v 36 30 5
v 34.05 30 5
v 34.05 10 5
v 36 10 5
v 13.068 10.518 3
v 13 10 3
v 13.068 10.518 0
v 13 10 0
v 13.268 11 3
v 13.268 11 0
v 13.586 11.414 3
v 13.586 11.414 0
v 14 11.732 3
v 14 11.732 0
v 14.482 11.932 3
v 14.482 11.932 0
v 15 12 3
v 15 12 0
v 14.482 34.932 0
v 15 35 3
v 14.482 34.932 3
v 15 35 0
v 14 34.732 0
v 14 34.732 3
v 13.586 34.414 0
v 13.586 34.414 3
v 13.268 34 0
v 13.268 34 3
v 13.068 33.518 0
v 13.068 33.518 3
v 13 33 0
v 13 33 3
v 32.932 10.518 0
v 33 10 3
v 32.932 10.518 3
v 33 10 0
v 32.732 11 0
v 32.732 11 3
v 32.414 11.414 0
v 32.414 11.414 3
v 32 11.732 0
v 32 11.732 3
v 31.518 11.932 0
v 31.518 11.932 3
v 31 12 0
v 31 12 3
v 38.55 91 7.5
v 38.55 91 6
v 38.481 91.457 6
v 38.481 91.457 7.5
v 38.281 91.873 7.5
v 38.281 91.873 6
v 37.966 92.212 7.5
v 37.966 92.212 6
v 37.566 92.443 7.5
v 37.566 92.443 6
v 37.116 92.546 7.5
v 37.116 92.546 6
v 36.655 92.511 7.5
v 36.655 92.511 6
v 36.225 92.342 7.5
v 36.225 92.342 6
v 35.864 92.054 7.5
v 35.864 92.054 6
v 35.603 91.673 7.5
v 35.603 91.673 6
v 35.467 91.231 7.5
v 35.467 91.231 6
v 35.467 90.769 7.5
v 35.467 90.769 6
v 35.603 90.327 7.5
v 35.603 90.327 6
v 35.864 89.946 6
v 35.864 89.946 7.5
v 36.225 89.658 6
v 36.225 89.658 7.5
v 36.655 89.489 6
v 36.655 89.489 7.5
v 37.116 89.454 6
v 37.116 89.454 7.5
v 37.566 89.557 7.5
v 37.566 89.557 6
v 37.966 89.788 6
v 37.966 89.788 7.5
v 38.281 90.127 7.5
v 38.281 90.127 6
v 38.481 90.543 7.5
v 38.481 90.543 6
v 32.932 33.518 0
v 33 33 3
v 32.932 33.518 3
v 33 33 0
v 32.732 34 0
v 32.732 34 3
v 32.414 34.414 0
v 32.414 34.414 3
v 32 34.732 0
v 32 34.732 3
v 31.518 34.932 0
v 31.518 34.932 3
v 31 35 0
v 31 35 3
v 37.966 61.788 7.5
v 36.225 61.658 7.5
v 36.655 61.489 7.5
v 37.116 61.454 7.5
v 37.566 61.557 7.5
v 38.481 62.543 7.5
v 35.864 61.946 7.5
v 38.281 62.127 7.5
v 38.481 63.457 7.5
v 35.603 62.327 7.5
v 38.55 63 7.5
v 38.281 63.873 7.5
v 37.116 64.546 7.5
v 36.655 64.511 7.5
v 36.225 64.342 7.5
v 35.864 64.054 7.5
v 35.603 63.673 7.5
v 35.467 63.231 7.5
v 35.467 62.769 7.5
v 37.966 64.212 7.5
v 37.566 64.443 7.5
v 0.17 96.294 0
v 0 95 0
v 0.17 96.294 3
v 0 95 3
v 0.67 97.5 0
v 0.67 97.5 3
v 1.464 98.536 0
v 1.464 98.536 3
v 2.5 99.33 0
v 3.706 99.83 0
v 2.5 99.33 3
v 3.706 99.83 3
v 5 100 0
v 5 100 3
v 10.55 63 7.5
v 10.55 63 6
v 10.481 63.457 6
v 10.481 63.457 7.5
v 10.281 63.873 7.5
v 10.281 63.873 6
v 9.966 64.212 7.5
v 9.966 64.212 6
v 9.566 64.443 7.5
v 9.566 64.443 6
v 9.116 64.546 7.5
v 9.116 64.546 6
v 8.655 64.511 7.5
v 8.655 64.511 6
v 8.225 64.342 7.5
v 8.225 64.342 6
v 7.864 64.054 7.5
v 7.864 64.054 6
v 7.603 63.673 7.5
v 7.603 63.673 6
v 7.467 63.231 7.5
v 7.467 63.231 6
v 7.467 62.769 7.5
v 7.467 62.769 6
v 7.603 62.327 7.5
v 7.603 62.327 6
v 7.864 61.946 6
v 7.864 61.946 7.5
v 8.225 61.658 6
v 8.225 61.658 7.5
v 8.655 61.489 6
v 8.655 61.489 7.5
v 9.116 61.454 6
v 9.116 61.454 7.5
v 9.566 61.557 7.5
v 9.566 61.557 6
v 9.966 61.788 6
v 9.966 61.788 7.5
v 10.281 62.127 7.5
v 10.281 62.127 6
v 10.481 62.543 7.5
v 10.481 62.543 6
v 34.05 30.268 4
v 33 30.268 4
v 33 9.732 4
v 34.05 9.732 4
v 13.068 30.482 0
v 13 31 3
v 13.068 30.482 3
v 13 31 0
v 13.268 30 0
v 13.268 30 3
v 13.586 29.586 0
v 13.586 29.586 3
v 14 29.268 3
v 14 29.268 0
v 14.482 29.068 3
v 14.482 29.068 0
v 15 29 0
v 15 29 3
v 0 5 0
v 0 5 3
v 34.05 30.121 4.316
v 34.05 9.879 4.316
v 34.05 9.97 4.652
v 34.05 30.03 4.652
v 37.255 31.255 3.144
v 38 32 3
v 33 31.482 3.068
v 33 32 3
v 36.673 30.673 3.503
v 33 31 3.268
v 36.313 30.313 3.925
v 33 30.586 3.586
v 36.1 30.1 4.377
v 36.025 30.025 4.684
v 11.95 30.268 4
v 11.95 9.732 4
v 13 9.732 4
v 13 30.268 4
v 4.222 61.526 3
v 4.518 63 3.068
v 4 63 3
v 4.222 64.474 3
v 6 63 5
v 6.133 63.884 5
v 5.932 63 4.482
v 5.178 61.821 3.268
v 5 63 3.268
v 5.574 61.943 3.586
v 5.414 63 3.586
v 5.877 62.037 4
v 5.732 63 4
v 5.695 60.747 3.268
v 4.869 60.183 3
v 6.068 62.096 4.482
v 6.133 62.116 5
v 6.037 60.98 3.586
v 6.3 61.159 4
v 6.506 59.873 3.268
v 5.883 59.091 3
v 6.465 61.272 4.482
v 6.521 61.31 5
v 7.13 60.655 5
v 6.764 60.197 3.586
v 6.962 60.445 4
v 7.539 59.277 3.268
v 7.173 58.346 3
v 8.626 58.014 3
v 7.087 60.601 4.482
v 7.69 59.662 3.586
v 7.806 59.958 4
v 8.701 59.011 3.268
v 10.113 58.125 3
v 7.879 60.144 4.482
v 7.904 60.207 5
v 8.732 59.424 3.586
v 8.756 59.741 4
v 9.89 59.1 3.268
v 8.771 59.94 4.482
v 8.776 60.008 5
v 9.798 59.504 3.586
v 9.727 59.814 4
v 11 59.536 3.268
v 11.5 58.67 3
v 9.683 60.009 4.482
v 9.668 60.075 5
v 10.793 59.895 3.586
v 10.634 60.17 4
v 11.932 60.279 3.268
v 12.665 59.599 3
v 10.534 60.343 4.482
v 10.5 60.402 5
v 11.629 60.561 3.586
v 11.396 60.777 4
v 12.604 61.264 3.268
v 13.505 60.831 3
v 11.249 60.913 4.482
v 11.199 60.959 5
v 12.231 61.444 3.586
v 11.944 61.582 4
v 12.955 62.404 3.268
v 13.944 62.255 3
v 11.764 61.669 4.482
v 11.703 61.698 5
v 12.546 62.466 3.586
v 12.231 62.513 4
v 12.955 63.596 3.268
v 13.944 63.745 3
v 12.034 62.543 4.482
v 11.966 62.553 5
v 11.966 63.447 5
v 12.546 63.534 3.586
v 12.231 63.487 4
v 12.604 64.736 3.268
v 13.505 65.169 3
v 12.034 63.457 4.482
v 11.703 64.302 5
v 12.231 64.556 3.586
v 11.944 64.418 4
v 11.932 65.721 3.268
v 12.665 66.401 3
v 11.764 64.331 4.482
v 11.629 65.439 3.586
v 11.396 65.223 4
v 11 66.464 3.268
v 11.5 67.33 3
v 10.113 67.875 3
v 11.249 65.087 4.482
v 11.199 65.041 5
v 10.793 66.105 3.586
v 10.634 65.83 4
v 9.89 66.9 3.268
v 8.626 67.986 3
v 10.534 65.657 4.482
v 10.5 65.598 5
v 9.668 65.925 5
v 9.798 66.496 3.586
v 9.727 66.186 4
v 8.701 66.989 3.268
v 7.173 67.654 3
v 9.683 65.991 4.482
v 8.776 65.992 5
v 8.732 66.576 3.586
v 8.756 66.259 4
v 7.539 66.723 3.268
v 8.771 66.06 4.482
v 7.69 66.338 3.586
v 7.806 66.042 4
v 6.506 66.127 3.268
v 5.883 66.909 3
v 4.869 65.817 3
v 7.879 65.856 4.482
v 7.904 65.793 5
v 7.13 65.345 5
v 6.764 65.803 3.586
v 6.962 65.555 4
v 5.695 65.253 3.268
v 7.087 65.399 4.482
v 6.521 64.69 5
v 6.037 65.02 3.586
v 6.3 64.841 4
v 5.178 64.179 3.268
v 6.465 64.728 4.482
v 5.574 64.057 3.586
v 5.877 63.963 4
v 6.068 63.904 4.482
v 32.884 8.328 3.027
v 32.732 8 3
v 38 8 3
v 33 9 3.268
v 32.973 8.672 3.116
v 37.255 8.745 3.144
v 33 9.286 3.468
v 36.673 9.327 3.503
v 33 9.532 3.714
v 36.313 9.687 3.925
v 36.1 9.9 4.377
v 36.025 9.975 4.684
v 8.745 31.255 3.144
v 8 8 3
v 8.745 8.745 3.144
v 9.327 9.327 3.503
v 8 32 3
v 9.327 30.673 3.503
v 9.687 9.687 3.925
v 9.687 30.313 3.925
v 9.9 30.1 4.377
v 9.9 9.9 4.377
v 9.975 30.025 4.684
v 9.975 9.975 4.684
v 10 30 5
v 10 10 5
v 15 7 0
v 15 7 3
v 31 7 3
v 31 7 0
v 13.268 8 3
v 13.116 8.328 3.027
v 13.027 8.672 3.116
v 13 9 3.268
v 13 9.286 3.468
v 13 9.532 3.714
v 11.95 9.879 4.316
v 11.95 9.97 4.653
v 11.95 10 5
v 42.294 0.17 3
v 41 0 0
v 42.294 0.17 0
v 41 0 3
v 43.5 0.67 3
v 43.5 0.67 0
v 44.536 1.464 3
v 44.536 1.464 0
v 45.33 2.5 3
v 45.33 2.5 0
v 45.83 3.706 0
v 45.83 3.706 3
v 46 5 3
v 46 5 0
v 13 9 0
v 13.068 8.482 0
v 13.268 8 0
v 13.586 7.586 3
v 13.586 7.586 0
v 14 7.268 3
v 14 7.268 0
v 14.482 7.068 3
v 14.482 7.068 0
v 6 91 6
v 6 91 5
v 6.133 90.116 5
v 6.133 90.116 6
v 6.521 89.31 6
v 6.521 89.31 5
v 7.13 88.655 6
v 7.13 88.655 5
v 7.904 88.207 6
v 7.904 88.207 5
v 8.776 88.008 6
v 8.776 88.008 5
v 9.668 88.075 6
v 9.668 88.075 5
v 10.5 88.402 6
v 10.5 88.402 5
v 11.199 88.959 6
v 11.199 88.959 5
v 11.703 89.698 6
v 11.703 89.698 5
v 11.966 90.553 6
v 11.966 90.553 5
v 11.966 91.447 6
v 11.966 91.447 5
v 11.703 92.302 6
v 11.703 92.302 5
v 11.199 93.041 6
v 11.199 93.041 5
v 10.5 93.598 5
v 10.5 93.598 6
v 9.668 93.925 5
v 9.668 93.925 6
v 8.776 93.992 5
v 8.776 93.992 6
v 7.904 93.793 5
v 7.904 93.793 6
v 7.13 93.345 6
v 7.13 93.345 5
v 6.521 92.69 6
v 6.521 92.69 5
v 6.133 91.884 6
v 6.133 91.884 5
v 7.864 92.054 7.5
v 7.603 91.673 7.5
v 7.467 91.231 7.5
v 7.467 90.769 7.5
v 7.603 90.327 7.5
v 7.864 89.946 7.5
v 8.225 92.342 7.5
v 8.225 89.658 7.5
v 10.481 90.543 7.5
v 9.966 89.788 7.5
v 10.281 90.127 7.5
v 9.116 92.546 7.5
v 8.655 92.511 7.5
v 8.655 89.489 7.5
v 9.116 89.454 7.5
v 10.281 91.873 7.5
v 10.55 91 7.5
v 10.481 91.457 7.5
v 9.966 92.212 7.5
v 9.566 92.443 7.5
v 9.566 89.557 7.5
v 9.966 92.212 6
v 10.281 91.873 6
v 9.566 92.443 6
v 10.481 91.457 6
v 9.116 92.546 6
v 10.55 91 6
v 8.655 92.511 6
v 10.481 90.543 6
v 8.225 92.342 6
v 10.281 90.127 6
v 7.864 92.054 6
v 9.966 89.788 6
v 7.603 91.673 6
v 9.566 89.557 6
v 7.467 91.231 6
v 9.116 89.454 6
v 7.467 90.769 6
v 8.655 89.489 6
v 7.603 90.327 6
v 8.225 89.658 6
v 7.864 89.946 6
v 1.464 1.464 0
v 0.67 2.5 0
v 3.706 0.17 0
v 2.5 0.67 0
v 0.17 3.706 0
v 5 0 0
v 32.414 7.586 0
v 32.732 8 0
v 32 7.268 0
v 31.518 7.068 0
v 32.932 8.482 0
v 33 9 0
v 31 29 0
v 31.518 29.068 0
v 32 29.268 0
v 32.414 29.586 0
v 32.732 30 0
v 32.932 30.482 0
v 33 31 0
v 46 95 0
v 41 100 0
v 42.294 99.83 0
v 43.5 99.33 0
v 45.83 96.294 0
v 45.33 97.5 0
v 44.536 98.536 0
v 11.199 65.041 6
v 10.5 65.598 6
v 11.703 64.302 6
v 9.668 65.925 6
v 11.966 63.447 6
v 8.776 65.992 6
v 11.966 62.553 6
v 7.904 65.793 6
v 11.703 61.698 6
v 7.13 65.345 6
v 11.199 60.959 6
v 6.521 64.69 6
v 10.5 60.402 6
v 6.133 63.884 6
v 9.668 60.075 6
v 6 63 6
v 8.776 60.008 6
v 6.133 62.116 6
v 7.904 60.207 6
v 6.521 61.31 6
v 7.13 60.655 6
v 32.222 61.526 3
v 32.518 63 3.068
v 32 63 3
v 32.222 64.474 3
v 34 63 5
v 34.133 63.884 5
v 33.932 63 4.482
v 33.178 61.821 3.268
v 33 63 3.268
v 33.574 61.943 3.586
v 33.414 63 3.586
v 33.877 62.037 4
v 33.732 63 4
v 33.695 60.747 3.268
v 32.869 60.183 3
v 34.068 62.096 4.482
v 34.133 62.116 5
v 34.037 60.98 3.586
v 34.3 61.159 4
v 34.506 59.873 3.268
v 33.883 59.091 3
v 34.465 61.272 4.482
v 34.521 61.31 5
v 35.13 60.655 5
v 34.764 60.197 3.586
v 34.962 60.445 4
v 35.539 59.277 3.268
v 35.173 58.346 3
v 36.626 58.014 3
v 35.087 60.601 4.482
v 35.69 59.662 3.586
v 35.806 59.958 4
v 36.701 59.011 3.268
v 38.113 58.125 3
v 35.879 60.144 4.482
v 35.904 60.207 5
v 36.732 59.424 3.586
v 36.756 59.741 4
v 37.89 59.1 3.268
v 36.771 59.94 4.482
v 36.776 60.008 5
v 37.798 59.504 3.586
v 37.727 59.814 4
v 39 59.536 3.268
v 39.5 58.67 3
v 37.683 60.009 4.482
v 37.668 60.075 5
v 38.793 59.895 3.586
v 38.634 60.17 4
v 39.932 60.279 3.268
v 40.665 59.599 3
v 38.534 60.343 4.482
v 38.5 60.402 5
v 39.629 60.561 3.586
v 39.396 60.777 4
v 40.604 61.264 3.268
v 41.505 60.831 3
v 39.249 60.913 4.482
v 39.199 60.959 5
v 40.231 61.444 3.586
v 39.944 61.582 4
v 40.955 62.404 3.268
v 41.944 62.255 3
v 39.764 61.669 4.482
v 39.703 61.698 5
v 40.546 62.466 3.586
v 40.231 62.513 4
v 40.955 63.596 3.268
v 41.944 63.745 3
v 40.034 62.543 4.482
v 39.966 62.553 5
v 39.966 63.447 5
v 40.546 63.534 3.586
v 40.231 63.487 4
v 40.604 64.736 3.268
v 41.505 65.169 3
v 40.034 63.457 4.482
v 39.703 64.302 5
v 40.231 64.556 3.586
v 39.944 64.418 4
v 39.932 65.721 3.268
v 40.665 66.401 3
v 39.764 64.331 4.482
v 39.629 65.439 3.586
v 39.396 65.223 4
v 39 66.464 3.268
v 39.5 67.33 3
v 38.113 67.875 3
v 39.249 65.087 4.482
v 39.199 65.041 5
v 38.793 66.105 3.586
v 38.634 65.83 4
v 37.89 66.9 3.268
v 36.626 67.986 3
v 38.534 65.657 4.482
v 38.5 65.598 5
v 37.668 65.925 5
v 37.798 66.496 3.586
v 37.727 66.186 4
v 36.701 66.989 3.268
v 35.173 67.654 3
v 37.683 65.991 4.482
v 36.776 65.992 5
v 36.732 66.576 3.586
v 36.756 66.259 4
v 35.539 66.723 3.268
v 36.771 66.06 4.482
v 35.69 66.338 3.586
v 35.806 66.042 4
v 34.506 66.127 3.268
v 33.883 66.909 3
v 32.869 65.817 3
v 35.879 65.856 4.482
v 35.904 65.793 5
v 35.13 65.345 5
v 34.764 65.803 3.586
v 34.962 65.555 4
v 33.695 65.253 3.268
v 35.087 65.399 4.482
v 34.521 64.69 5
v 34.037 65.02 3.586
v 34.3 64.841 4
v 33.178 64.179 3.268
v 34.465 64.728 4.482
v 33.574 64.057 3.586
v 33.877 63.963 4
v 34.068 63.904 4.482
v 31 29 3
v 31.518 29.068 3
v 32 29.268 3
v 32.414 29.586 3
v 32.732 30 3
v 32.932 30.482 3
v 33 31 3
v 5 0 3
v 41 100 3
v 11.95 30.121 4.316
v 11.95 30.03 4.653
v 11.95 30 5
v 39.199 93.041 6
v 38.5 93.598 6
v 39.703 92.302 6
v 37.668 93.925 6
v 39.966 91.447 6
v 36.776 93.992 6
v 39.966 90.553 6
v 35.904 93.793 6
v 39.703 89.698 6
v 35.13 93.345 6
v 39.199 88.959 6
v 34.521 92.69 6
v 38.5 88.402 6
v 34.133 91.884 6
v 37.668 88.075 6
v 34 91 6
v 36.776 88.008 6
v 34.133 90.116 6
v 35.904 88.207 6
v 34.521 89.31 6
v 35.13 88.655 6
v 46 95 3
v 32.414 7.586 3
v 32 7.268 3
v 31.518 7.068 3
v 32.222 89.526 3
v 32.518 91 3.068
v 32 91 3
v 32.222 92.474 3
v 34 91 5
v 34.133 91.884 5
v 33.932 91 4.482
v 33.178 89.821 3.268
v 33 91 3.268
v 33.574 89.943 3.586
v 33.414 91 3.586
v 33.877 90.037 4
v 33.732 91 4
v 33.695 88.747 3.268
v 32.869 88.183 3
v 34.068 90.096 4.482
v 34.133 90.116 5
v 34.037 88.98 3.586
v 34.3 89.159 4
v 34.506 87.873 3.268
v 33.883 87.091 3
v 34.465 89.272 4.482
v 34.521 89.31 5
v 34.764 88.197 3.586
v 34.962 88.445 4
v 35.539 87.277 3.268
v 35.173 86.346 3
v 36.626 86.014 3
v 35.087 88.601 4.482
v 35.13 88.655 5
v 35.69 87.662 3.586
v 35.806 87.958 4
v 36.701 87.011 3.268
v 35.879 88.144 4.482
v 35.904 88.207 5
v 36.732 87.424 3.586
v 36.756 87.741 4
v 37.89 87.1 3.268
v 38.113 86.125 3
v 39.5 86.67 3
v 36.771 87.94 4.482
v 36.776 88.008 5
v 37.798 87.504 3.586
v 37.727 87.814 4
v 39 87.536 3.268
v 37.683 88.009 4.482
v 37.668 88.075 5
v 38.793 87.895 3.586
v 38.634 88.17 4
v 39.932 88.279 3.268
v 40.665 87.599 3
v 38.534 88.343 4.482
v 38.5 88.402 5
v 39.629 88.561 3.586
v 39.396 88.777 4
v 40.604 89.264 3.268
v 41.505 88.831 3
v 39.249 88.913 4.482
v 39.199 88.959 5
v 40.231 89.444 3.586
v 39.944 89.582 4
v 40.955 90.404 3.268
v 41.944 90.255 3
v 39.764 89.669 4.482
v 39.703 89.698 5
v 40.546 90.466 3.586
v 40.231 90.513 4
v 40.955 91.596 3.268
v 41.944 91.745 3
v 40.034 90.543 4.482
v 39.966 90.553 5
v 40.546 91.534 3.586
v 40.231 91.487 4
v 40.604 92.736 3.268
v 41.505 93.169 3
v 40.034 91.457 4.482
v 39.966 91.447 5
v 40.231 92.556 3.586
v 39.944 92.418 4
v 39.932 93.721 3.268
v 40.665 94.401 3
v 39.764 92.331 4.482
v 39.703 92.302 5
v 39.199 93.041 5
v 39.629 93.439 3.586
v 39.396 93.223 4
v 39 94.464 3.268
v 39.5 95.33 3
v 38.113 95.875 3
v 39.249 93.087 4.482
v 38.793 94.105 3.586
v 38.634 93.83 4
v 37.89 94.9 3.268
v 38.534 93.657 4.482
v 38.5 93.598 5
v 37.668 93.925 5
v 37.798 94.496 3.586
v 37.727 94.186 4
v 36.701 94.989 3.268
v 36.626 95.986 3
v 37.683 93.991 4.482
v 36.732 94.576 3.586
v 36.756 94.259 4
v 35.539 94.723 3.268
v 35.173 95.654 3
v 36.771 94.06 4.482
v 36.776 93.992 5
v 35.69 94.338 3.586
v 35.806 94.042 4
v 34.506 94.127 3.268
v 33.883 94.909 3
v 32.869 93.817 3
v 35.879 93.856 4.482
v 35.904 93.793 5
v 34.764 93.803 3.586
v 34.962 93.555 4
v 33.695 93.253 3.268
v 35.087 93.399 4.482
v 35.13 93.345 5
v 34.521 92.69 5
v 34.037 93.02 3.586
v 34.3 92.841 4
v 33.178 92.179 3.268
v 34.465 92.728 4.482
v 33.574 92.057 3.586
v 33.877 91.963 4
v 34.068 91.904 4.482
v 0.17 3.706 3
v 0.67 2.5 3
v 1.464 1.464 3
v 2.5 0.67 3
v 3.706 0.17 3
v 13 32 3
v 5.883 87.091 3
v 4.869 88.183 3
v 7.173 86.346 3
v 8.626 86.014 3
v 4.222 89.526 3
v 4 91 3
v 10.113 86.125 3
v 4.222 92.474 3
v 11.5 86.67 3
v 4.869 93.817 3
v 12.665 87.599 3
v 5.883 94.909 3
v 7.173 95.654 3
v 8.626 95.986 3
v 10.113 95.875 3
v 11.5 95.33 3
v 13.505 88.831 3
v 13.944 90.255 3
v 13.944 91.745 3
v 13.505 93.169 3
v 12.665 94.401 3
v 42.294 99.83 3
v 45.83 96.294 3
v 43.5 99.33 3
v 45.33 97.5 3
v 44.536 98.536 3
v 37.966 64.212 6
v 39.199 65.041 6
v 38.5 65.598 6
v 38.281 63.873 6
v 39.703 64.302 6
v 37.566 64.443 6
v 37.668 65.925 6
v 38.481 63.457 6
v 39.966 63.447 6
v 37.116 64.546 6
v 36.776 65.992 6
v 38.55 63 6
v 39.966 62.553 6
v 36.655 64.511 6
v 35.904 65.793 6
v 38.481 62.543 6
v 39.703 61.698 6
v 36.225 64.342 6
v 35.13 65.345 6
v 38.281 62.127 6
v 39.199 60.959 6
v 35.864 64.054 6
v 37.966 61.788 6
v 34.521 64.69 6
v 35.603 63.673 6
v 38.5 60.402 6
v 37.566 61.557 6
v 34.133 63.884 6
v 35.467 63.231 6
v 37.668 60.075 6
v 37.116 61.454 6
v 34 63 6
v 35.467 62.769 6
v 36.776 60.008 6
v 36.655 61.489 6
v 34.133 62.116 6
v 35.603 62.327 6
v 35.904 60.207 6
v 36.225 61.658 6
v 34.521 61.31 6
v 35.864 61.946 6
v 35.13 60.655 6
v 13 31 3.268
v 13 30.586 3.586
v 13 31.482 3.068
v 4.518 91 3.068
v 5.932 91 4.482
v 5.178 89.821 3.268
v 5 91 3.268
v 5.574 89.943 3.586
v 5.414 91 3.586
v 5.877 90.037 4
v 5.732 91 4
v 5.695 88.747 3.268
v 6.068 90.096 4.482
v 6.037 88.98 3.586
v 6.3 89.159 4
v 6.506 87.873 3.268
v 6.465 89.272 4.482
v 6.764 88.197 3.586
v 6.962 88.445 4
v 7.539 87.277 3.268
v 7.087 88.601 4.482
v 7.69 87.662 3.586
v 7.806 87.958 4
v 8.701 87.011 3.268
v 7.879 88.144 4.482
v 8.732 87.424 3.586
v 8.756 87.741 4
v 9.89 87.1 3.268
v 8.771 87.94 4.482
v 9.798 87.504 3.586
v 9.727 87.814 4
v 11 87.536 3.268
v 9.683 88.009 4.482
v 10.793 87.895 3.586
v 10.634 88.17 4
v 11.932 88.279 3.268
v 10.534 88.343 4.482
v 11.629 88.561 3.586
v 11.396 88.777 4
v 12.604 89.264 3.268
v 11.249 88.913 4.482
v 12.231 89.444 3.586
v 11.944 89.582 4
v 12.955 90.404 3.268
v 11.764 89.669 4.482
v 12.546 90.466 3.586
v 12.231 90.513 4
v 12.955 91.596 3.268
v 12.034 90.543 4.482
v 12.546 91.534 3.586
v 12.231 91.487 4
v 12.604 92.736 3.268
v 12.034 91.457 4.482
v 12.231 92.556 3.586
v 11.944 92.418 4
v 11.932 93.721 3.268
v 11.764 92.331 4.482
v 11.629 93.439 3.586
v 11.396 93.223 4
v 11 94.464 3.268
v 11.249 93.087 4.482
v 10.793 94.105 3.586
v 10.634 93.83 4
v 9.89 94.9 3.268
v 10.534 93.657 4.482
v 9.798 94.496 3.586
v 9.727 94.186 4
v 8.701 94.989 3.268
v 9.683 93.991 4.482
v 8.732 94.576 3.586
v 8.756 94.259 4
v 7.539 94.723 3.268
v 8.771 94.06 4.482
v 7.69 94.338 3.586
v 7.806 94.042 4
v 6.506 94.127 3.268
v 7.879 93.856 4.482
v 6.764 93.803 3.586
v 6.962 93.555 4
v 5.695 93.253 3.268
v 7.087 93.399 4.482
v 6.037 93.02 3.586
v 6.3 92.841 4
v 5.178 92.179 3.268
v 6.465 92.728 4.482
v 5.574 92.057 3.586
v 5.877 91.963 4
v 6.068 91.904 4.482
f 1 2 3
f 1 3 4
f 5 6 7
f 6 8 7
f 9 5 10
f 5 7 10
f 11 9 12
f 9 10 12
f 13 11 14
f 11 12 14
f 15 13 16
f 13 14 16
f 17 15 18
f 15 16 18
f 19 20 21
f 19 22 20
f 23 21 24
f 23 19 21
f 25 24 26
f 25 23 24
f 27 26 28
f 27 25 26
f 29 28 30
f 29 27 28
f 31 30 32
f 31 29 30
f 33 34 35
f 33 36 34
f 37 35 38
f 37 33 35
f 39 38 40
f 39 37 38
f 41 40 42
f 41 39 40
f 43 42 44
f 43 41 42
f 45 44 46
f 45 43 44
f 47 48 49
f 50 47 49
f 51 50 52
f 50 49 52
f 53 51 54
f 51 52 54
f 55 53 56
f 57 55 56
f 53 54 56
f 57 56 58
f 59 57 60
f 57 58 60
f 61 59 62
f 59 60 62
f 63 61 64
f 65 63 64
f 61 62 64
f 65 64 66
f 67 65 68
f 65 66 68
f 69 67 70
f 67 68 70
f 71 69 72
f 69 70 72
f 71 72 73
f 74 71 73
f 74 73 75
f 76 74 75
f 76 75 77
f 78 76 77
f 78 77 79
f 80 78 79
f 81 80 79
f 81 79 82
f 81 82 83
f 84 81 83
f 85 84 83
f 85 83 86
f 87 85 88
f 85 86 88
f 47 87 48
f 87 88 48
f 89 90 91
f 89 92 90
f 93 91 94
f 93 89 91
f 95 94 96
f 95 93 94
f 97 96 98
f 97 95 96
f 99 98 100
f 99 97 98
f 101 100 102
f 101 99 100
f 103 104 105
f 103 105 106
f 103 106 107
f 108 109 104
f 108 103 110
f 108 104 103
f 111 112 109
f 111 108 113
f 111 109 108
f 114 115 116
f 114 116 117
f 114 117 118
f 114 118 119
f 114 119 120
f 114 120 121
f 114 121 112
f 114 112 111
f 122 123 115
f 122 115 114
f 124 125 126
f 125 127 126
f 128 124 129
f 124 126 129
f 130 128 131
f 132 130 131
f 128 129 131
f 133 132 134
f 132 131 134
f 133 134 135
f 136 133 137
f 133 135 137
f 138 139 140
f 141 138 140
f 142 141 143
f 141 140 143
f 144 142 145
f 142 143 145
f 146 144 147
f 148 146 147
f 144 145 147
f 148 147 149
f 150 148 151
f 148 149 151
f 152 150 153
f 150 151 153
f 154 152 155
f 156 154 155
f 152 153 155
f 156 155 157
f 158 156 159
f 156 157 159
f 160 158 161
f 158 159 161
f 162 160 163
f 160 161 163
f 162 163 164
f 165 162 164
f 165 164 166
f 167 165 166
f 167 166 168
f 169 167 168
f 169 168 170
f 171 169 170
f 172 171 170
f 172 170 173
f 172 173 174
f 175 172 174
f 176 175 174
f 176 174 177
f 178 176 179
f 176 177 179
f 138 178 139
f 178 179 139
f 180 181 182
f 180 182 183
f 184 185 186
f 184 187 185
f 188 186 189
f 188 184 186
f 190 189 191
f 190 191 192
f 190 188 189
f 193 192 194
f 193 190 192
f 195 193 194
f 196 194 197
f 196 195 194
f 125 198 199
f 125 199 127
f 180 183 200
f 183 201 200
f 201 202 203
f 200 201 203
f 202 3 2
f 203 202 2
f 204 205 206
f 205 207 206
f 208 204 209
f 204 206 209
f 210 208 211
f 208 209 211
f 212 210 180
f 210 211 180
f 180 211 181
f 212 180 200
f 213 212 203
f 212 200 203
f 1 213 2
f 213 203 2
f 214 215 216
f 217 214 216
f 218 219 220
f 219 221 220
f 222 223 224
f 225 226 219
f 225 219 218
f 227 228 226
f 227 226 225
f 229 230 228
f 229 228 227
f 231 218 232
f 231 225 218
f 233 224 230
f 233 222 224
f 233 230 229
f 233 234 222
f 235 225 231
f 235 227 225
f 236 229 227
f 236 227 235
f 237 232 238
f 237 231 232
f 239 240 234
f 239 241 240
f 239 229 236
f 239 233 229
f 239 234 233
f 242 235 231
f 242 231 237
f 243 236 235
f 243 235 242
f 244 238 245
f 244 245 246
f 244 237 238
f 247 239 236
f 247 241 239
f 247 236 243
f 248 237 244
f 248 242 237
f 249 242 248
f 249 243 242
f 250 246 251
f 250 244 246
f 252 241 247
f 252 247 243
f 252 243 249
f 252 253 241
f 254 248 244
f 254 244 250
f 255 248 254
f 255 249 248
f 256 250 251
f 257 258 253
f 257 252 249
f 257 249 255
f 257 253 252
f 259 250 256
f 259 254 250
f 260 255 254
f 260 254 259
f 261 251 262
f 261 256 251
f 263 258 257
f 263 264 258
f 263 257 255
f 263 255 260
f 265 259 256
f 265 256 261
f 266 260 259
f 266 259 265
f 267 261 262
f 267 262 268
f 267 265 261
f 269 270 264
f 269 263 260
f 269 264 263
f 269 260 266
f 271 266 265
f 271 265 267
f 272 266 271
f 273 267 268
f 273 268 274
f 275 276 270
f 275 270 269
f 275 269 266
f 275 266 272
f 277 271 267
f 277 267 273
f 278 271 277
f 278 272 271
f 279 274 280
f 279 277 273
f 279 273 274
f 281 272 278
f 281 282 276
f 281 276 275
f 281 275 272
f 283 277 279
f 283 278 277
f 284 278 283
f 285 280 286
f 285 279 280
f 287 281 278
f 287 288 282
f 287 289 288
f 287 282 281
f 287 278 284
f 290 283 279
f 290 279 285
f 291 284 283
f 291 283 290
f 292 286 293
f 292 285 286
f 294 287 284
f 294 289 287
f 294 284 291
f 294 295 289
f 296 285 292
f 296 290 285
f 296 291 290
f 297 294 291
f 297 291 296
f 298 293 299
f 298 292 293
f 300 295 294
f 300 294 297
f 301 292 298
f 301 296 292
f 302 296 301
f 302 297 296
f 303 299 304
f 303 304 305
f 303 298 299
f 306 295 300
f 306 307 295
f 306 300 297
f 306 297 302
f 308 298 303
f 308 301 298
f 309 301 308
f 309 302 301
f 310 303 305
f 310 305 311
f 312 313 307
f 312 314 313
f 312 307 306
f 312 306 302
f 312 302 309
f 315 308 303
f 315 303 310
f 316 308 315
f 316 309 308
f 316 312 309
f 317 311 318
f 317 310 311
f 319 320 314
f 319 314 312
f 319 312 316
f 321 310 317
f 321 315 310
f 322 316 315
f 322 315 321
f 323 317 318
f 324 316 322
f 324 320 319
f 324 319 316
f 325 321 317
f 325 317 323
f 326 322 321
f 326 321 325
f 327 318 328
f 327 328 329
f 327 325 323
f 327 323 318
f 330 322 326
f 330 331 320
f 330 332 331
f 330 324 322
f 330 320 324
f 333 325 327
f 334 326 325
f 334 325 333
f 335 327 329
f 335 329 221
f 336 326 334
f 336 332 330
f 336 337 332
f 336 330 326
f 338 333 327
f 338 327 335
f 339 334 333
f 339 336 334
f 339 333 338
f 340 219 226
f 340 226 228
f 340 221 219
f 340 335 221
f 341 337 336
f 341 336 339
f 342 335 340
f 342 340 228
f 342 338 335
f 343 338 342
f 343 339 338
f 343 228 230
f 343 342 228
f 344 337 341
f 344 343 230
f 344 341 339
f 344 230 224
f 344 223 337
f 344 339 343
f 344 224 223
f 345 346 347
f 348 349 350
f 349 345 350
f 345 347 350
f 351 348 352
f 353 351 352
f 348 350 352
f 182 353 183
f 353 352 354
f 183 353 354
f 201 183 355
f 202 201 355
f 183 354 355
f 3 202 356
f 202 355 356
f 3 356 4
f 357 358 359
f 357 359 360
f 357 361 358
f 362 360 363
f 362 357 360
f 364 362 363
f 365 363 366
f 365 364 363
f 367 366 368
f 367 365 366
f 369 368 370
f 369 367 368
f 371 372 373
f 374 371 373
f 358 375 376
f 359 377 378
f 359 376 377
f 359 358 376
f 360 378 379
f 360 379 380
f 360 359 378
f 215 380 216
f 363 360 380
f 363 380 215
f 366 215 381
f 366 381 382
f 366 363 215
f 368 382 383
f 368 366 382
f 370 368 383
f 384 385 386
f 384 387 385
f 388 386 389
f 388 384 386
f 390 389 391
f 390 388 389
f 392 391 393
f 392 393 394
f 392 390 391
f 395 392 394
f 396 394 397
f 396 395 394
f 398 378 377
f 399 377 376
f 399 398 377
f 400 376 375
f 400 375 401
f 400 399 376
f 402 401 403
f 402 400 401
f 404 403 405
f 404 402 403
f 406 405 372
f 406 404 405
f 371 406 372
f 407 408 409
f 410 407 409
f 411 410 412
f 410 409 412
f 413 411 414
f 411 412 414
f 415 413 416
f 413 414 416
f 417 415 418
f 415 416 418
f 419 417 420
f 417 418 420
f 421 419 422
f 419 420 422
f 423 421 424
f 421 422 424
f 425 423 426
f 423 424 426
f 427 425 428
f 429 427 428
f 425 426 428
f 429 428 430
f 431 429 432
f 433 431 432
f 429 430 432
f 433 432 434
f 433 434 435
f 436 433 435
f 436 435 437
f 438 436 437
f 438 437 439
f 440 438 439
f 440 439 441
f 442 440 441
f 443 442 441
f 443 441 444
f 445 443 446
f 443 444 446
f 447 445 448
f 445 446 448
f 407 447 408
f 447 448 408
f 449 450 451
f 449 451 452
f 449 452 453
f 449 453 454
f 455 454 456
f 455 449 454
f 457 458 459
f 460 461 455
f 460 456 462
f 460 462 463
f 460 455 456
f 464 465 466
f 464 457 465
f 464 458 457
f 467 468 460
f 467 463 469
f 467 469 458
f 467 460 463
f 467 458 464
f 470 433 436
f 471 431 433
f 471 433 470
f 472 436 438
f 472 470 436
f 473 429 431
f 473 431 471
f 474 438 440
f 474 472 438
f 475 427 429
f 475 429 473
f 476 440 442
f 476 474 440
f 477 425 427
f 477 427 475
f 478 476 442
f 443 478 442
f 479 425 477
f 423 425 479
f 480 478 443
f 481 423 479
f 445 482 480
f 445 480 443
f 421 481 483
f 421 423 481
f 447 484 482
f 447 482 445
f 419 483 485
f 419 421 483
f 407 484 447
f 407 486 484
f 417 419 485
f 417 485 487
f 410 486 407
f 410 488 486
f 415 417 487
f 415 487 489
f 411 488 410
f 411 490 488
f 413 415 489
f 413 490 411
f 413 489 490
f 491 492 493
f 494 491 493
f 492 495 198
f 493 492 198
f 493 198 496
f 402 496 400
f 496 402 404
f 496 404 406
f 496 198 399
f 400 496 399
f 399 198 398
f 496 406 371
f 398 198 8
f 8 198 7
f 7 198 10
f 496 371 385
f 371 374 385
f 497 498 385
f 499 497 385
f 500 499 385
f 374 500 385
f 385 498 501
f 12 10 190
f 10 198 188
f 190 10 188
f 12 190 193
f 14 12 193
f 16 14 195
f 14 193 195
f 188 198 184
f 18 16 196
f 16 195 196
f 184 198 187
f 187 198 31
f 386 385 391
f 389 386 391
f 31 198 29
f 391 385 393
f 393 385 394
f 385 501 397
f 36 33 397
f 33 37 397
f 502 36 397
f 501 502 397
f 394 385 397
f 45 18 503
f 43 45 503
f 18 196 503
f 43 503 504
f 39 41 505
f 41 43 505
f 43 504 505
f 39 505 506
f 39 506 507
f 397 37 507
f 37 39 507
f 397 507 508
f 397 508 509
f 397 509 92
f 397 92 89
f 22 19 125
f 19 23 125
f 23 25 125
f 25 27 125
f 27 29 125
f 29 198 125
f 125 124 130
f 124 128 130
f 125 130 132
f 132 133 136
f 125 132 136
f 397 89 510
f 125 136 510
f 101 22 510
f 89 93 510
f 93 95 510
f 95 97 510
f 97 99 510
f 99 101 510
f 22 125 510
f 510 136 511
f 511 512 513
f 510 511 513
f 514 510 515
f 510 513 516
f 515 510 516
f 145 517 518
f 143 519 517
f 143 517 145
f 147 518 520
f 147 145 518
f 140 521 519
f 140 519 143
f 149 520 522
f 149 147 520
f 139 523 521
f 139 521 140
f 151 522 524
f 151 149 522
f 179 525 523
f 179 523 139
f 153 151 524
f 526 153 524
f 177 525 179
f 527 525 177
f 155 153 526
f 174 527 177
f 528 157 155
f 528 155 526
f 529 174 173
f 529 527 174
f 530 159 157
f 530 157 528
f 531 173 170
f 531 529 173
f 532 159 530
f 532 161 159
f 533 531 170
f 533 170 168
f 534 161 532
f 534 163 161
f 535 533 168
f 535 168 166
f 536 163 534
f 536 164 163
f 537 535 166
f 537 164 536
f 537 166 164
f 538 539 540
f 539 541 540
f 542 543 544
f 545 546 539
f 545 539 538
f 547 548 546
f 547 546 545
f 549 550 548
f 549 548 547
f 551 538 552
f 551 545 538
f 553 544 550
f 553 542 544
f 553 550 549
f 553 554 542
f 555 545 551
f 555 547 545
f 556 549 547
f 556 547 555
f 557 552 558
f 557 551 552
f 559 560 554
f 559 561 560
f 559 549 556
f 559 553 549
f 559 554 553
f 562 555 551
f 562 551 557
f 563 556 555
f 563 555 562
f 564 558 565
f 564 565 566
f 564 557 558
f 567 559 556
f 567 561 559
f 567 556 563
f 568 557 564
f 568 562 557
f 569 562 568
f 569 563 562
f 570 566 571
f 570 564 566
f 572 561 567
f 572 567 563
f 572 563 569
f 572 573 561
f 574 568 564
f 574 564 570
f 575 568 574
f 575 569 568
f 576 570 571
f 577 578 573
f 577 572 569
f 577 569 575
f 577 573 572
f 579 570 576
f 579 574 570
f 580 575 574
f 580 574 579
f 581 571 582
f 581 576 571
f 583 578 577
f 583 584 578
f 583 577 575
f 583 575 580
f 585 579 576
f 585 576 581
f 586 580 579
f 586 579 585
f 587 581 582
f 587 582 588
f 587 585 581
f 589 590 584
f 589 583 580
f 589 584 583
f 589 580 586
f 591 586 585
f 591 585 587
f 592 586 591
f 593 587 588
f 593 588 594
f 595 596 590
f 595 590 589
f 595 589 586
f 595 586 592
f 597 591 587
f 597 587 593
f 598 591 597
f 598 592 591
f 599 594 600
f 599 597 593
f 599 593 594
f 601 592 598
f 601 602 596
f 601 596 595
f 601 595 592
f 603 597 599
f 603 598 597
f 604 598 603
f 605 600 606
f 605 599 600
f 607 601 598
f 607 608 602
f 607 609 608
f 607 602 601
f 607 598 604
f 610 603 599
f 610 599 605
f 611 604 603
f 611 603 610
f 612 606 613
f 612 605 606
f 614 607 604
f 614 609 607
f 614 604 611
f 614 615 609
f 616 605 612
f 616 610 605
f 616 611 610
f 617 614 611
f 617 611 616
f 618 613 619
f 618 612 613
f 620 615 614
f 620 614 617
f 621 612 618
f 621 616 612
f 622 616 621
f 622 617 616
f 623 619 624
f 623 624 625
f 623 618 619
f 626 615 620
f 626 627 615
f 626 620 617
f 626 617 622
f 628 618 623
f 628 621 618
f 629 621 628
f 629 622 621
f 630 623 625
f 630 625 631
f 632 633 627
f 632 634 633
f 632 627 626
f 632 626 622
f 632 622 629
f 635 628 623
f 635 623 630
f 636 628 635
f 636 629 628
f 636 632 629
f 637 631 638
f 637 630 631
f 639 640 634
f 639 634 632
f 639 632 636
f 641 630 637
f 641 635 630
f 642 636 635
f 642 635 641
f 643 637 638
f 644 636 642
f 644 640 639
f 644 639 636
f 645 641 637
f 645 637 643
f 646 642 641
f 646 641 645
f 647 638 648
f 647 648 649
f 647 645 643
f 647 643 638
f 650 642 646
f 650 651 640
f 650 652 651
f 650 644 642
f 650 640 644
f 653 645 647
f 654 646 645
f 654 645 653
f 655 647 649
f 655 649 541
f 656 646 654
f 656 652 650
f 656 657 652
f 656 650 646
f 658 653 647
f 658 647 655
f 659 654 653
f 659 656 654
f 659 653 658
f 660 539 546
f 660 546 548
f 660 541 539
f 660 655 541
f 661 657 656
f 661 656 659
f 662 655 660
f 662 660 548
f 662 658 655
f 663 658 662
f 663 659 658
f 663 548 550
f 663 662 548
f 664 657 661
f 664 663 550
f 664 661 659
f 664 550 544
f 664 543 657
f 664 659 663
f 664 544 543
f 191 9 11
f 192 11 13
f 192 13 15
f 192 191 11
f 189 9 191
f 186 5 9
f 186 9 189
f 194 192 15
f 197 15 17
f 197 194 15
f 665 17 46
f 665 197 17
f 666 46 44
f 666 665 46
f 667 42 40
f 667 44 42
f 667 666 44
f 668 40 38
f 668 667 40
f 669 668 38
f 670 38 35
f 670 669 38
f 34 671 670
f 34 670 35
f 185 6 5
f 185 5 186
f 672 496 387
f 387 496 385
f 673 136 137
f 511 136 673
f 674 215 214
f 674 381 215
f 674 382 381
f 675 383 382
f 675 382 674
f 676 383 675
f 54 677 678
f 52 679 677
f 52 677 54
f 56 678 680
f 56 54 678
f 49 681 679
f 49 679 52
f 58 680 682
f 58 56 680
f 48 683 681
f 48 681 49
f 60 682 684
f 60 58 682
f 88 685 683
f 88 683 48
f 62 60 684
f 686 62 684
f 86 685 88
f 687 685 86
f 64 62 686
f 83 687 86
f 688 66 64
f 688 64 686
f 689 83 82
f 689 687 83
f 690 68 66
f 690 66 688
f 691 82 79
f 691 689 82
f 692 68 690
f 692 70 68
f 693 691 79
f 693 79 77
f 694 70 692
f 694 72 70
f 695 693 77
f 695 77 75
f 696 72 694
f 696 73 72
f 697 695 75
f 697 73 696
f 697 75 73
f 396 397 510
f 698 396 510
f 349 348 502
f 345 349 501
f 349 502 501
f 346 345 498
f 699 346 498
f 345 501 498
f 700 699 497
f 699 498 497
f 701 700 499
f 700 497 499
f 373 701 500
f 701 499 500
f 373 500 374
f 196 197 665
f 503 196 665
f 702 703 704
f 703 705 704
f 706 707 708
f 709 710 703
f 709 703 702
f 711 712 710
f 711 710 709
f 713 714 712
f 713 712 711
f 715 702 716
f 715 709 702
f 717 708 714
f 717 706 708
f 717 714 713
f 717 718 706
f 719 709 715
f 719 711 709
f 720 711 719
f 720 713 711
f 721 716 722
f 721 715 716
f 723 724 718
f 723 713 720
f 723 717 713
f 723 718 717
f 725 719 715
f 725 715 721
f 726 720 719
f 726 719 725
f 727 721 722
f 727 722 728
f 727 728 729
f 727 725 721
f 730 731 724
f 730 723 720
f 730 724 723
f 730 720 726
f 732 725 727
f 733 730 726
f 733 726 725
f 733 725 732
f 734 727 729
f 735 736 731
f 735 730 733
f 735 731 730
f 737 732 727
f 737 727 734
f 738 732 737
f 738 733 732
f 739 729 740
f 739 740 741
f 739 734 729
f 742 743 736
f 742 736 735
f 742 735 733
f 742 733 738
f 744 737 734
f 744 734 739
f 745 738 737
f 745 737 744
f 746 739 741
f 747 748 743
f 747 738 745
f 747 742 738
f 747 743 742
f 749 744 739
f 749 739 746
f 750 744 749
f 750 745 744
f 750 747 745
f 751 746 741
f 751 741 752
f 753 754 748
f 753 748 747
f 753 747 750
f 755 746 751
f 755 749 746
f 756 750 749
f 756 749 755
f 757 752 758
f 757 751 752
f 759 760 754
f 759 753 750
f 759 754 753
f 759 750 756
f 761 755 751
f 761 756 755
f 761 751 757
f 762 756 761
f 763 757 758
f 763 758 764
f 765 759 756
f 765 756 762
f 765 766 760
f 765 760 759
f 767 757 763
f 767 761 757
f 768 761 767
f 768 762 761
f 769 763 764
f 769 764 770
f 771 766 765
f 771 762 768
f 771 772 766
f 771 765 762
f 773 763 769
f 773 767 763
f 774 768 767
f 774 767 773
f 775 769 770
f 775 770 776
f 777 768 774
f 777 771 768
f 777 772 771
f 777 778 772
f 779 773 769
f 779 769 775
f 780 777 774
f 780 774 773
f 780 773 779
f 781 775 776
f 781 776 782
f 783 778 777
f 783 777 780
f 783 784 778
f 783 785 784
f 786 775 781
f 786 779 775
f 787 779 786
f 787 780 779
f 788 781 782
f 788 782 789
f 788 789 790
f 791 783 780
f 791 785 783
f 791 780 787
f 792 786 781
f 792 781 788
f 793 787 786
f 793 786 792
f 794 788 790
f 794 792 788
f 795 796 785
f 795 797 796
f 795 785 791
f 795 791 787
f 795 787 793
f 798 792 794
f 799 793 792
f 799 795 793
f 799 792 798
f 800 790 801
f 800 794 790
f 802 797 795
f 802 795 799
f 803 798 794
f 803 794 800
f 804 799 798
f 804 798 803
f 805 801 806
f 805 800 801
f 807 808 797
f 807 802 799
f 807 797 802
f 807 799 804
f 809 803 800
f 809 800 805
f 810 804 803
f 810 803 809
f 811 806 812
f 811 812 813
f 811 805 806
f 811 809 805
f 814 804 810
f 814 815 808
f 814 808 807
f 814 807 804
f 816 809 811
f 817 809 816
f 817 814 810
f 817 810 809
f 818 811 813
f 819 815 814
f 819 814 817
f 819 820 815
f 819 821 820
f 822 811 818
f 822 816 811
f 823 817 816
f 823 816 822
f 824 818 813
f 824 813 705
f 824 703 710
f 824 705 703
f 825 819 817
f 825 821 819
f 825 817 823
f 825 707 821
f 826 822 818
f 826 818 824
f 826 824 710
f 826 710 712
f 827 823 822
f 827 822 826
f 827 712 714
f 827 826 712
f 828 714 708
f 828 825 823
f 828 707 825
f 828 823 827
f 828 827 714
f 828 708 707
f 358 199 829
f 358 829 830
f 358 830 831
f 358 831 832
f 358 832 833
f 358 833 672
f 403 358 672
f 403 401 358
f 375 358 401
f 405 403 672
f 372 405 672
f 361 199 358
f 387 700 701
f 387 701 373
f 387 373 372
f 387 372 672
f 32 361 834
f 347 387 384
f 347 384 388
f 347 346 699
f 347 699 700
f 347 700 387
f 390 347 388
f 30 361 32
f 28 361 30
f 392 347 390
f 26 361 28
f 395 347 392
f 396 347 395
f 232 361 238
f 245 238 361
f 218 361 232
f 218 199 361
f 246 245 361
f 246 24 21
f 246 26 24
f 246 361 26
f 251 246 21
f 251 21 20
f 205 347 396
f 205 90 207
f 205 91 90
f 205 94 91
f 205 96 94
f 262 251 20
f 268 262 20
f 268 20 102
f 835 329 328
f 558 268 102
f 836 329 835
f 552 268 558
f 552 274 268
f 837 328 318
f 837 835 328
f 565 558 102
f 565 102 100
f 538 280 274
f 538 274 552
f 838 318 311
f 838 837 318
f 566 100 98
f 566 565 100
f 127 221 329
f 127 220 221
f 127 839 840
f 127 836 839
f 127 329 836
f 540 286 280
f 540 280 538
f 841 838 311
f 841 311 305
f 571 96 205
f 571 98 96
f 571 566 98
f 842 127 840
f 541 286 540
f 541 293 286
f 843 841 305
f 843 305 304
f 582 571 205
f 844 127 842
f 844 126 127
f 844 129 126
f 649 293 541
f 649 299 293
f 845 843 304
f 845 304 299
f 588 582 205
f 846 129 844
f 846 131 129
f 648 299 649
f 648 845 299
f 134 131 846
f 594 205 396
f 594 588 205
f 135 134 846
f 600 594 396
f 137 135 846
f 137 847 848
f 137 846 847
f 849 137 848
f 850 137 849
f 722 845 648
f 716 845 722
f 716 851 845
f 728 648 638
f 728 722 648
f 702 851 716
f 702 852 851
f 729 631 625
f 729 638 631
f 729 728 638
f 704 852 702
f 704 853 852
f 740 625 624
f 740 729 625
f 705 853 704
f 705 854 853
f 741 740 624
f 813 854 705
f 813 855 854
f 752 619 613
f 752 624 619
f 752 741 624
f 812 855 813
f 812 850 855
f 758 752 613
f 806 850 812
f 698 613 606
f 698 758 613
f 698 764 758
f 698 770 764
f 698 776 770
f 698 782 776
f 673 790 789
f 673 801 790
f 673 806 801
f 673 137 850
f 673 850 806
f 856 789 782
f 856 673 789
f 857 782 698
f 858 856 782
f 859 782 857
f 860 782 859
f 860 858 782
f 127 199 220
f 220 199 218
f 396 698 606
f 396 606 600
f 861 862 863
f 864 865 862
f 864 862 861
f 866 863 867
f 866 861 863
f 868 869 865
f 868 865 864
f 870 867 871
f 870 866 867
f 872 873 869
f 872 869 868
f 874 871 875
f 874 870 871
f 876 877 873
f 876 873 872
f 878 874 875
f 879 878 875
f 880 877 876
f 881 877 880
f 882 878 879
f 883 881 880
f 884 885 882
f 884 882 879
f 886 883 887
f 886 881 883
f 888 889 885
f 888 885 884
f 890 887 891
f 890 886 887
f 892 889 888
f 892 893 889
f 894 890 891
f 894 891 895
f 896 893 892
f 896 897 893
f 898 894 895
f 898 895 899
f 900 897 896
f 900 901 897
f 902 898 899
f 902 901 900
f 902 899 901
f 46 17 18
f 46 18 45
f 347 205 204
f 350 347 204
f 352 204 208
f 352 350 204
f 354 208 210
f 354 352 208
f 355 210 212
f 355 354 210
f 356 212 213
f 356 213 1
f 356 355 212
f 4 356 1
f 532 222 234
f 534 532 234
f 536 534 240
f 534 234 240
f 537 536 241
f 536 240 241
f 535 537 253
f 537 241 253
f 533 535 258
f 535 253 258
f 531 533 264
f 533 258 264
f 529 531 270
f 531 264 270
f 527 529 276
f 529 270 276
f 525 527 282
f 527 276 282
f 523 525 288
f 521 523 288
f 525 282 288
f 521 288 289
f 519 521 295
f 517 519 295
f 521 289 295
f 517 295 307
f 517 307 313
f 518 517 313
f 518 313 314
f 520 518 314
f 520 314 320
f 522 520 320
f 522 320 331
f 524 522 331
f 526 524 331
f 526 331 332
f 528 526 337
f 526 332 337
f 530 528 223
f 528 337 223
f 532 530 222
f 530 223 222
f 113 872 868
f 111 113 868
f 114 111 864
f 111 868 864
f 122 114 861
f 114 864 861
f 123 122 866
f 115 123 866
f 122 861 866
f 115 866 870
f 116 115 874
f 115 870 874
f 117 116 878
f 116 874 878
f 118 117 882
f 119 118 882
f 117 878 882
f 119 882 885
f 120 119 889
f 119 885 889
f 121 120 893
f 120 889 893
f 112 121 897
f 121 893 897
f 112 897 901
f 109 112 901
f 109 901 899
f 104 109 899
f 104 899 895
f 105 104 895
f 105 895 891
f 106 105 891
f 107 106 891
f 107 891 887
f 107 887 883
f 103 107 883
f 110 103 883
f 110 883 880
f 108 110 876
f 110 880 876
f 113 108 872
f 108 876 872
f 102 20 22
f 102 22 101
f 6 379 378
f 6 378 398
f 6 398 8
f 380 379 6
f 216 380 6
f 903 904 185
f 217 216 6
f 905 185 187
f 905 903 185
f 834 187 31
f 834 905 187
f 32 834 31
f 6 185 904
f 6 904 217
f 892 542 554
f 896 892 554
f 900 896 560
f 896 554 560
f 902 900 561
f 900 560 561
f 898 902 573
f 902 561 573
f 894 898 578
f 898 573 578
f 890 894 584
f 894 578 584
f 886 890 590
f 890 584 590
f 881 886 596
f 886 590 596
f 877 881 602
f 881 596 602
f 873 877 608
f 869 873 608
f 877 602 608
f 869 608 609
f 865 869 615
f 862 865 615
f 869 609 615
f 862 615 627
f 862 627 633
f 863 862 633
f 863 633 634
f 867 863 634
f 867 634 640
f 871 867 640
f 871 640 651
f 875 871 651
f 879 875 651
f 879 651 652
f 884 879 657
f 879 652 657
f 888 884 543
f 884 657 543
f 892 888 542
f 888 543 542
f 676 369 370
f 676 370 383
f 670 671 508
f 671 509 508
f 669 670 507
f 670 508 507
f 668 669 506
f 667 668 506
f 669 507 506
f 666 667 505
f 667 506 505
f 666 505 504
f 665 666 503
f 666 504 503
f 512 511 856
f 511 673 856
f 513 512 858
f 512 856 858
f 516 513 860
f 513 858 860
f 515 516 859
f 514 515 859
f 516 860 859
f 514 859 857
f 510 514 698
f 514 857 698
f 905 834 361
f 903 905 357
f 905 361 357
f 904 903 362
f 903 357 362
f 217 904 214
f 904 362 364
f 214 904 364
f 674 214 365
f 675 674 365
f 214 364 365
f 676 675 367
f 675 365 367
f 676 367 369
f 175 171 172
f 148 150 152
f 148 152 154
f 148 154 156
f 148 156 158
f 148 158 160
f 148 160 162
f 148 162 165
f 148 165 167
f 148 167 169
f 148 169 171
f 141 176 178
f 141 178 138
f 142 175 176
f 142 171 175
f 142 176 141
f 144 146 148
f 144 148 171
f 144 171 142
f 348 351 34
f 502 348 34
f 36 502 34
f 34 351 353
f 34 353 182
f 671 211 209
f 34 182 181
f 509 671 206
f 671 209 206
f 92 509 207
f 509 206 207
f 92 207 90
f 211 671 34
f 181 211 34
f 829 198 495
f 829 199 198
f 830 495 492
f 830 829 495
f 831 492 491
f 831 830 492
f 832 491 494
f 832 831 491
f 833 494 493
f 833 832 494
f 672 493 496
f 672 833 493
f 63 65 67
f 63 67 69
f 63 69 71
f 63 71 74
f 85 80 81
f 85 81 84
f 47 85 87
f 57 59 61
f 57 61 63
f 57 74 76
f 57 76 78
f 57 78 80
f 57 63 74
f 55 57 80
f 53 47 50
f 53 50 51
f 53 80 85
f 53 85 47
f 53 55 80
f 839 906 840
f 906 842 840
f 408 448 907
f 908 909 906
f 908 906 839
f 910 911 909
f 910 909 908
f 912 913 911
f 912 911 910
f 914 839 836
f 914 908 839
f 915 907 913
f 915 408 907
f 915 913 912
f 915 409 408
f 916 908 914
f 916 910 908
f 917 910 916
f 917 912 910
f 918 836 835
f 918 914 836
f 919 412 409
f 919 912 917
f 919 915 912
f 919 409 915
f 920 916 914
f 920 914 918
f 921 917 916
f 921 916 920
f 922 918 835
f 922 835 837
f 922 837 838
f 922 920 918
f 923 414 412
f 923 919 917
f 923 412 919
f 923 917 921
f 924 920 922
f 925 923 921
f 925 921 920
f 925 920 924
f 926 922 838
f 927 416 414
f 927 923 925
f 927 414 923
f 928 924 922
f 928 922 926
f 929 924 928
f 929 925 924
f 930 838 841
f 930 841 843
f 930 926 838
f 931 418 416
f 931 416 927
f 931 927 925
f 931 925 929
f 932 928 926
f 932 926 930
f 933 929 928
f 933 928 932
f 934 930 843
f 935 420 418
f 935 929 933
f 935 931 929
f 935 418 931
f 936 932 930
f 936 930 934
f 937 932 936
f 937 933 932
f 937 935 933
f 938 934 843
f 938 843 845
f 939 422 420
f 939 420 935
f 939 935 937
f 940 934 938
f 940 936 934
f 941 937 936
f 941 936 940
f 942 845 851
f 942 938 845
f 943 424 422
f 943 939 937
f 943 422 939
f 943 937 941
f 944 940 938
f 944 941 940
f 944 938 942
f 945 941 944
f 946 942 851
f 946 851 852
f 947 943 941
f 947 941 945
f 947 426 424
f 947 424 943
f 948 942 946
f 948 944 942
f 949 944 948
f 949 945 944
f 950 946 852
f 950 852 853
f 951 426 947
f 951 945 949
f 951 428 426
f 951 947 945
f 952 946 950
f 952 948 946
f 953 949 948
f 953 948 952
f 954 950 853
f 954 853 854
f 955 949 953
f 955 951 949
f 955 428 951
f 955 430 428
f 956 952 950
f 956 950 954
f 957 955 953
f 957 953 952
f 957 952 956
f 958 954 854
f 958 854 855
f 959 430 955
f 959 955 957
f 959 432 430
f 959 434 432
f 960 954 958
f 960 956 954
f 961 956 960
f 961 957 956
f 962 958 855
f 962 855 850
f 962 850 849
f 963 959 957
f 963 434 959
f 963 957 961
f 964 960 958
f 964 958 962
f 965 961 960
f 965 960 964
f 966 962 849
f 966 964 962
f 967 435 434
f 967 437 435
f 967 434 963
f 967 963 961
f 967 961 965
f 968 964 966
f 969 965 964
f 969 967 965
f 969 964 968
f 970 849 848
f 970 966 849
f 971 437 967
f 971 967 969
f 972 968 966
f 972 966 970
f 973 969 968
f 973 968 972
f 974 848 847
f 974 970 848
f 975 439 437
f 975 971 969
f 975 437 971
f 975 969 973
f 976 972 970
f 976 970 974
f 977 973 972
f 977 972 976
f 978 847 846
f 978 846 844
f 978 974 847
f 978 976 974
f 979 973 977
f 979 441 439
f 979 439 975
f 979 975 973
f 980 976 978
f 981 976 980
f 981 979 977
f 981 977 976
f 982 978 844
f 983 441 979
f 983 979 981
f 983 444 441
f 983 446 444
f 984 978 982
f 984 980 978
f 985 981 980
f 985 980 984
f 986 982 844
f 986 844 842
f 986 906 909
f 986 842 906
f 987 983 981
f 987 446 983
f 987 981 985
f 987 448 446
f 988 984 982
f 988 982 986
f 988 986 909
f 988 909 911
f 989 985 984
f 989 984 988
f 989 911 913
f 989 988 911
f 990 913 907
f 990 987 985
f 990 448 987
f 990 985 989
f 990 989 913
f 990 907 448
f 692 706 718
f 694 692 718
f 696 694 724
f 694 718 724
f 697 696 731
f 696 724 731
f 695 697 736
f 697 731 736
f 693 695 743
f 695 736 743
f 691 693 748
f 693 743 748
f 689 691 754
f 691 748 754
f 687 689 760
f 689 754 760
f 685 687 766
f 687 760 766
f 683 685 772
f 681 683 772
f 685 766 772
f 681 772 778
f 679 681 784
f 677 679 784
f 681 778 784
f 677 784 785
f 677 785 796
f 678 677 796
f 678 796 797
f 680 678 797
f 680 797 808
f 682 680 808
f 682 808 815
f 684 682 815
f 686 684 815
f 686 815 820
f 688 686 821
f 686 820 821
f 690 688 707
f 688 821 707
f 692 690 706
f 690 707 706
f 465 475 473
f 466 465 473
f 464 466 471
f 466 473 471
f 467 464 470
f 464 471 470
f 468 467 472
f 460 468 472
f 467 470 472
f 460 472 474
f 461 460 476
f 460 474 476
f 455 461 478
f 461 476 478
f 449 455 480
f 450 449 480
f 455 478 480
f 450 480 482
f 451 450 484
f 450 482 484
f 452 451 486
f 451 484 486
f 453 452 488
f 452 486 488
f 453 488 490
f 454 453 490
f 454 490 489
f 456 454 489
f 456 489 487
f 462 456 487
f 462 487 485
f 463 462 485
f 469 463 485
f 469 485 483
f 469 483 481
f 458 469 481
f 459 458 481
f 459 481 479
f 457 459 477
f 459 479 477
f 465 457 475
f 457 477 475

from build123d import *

# Parameters (mm, degrees)
SKETCH_1_W          = 46
SKETCH_1_H          = 100
EXTRUDE_1_DEPTH     = 3
SKETCH_2_R          = 3
EXTRUDE_2_DEPTH     = 3
SKETCH_3_R          = 1.55
EXTRUDE_3_DEPTH     = 1.5
FILLET_1_R          = 2
FILLET_2_R          = 5
SKETCH_4_W          = 2
SKETCH_4_H          = 20
SKETCH_4_W_2        = 1
EXTRUDE_4_DEPTH     = 2
SKETCH_5_W          = 22.1
SKETCH_5_H          = 30
CUT_EXTRUDE_1_DEPTH = 1
FILLET_3_R          = 2
SKETCH_6_W          = 20
SKETCH_6_H          = 6
SKETCH_6_H_2        = 5
CUT_EXTRUDE_2_DEPTH = 10
FILLET_4_R          = 2


with BuildPart() as part:
    # ｽｹｯﾁ1 → ﾎﾞｽ - 押し出し1 (new body)
    with BuildSketch(Plane.XY):
        with Locations((23, 50)):
            Rectangle(SKETCH_1_W, SKETCH_1_H)
    extrude(amount=EXTRUDE_1_DEPTH)

    # ｽｹｯﾁ2 → ﾎﾞｽ - 押し出し2 (add)
    with BuildSketch(Plane.XY.offset(3)):
        with Locations(Location((9, 91, 0), (0, 0, 180))):
            Circle(SKETCH_2_R)
        with Locations(Location((37, 91, 0), (0, 0, 180))):
            Circle(SKETCH_2_R)
        with Locations(Location((9, 63, 0), (0, 0, 180))):
            Circle(SKETCH_2_R)
        with Locations(Location((37, 63, 0), (0, 0, 180))):
            Circle(SKETCH_2_R)
    extrude(amount=EXTRUDE_2_DEPTH)

    # ｽｹｯﾁ3 → ﾎﾞｽ - 押し出し3 (add)
    with BuildSketch(Plane.XY.offset(6)):
        with Locations((9, 91)):
            Circle(SKETCH_3_R)
        with Locations((37, 91)):
            Circle(SKETCH_3_R)
        with Locations((9, 63)):
            Circle(SKETCH_3_R)
        with Locations((37, 63)):
            Circle(SKETCH_3_R)
    extrude(amount=EXTRUDE_3_DEPTH)

    # ﾌｨﾚｯﾄ1
    fillet_1_edges = [part.edges().sort_by_distance(p)[0] for p in [
        (12, 91, 3),
        (40, 91, 3),
        (12, 63, 3),
        (40, 63, 3),
    ]]
    fillet(fillet_1_edges, radius=FILLET_1_R)

    # ﾌｨﾚｯﾄ2
    fillet_2_edges = [part.edges().sort_by_distance(p)[0] for p in [
        (0, 100, 1.5),
        (46, 100, 1.5),
        (46, 0, 1.5),
        (0, 0, 1.5),
    ]]
    fillet(fillet_2_edges, radius=FILLET_2_R)

    # ｽｹｯﾁ4 → ﾎﾞｽ - 押し出し4 (add)
    with BuildSketch(Plane.XY.offset(3)):
        with Locations((11, 20)):
            Rectangle(SKETCH_4_W, SKETCH_4_H)
        with Locations((12.5, 20)):
            Rectangle(SKETCH_4_W_2, SKETCH_4_H)
        with Locations((33.5, 20)):
            Rectangle(SKETCH_4_W_2, SKETCH_4_H)
        with Locations((35, 20)):
            Rectangle(SKETCH_4_W, SKETCH_4_H)
    extrude(amount=EXTRUDE_4_DEPTH)

    # ｽｹｯﾁ5 → ｶｯﾄ - 押し出し1 (cut)
    with BuildSketch(Plane.XY.offset(5)):
        with Locations((23, 20)):
            Rectangle(SKETCH_5_W, SKETCH_5_H)
    extrude(amount=-CUT_EXTRUDE_1_DEPTH, mode=Mode.SUBTRACT)

    # ﾌｨﾚｯﾄ3
    fillet_3_edges = [part.edges().sort_by_distance(p)[0] for p in [
        (11.5, 30, 3),
    ]]
    fillet(fillet_3_edges, radius=FILLET_3_R - 0.0001)  # a hair under: the kernel refuses the full size
    fillet_3_2_edges = [part.edges().sort_by_distance(p)[0] for p in [
        (10, 20, 3),
    ]]
    fillet(fillet_3_2_edges, radius=FILLET_3_R - 0.0001)  # a hair under: the kernel refuses the full size
    fillet_3_3_edges = [part.edges().sort_by_distance(p)[0] for p in [
        (11.5, 10, 3),
    ]]
    fillet(fillet_3_3_edges, radius=FILLET_3_R - 0.0001)  # a hair under: the kernel refuses the full size
    fillet_3_4_edges = [part.edges().sort_by_distance(p)[0] for p in [
        (34.5, 30, 3),
    ]]
    fillet(fillet_3_4_edges, radius=FILLET_3_R - 0.0004)  # a hair under: the kernel refuses the full size
    fillet_3_5_edges = [part.edges().sort_by_distance(p)[0] for p in [
        (34.5, 10, 3),
    ]]
    fillet(fillet_3_5_edges, radius=FILLET_3_R - 0.0004)  # a hair under: the kernel refuses the full size
    fillet_3_6_edges = [part.edges().sort_by_distance(p)[0] for p in [
        (36, 20, 3),
    ]]
    fillet(fillet_3_6_edges, radius=FILLET_3_R - 0.0004)  # a hair under: the kernel refuses the full size

    # ｽｹｯﾁ6 → ｶｯﾄ - 押し出し2 (cut)
    with BuildSketch(Plane.XY.offset(3)):
        with Locations((23, 32)):
            Rectangle(SKETCH_6_W, SKETCH_6_H)
        with Locations((23, 9.5)):
            Rectangle(SKETCH_6_W, SKETCH_6_H_2)
    extrude(amount=-CUT_EXTRUDE_2_DEPTH, mode=Mode.SUBTRACT)

    # ﾌｨﾚｯﾄ4
    fillet_4_edges = [part.edges().sort_by_distance(p)[0] for p in [
        (13, 29, 1.5),
        (13, 35, 1.5),
        (33, 35, 1.5),
        (33, 29, 1.5),
        (13, 7, 1.5),
        (13, 12, 1.5),
        (33, 12, 1.5),
        (33, 7, 1.5),
    ]]
    fillet(fillet_4_edges, radius=FILLET_4_R)


solid = part.part
